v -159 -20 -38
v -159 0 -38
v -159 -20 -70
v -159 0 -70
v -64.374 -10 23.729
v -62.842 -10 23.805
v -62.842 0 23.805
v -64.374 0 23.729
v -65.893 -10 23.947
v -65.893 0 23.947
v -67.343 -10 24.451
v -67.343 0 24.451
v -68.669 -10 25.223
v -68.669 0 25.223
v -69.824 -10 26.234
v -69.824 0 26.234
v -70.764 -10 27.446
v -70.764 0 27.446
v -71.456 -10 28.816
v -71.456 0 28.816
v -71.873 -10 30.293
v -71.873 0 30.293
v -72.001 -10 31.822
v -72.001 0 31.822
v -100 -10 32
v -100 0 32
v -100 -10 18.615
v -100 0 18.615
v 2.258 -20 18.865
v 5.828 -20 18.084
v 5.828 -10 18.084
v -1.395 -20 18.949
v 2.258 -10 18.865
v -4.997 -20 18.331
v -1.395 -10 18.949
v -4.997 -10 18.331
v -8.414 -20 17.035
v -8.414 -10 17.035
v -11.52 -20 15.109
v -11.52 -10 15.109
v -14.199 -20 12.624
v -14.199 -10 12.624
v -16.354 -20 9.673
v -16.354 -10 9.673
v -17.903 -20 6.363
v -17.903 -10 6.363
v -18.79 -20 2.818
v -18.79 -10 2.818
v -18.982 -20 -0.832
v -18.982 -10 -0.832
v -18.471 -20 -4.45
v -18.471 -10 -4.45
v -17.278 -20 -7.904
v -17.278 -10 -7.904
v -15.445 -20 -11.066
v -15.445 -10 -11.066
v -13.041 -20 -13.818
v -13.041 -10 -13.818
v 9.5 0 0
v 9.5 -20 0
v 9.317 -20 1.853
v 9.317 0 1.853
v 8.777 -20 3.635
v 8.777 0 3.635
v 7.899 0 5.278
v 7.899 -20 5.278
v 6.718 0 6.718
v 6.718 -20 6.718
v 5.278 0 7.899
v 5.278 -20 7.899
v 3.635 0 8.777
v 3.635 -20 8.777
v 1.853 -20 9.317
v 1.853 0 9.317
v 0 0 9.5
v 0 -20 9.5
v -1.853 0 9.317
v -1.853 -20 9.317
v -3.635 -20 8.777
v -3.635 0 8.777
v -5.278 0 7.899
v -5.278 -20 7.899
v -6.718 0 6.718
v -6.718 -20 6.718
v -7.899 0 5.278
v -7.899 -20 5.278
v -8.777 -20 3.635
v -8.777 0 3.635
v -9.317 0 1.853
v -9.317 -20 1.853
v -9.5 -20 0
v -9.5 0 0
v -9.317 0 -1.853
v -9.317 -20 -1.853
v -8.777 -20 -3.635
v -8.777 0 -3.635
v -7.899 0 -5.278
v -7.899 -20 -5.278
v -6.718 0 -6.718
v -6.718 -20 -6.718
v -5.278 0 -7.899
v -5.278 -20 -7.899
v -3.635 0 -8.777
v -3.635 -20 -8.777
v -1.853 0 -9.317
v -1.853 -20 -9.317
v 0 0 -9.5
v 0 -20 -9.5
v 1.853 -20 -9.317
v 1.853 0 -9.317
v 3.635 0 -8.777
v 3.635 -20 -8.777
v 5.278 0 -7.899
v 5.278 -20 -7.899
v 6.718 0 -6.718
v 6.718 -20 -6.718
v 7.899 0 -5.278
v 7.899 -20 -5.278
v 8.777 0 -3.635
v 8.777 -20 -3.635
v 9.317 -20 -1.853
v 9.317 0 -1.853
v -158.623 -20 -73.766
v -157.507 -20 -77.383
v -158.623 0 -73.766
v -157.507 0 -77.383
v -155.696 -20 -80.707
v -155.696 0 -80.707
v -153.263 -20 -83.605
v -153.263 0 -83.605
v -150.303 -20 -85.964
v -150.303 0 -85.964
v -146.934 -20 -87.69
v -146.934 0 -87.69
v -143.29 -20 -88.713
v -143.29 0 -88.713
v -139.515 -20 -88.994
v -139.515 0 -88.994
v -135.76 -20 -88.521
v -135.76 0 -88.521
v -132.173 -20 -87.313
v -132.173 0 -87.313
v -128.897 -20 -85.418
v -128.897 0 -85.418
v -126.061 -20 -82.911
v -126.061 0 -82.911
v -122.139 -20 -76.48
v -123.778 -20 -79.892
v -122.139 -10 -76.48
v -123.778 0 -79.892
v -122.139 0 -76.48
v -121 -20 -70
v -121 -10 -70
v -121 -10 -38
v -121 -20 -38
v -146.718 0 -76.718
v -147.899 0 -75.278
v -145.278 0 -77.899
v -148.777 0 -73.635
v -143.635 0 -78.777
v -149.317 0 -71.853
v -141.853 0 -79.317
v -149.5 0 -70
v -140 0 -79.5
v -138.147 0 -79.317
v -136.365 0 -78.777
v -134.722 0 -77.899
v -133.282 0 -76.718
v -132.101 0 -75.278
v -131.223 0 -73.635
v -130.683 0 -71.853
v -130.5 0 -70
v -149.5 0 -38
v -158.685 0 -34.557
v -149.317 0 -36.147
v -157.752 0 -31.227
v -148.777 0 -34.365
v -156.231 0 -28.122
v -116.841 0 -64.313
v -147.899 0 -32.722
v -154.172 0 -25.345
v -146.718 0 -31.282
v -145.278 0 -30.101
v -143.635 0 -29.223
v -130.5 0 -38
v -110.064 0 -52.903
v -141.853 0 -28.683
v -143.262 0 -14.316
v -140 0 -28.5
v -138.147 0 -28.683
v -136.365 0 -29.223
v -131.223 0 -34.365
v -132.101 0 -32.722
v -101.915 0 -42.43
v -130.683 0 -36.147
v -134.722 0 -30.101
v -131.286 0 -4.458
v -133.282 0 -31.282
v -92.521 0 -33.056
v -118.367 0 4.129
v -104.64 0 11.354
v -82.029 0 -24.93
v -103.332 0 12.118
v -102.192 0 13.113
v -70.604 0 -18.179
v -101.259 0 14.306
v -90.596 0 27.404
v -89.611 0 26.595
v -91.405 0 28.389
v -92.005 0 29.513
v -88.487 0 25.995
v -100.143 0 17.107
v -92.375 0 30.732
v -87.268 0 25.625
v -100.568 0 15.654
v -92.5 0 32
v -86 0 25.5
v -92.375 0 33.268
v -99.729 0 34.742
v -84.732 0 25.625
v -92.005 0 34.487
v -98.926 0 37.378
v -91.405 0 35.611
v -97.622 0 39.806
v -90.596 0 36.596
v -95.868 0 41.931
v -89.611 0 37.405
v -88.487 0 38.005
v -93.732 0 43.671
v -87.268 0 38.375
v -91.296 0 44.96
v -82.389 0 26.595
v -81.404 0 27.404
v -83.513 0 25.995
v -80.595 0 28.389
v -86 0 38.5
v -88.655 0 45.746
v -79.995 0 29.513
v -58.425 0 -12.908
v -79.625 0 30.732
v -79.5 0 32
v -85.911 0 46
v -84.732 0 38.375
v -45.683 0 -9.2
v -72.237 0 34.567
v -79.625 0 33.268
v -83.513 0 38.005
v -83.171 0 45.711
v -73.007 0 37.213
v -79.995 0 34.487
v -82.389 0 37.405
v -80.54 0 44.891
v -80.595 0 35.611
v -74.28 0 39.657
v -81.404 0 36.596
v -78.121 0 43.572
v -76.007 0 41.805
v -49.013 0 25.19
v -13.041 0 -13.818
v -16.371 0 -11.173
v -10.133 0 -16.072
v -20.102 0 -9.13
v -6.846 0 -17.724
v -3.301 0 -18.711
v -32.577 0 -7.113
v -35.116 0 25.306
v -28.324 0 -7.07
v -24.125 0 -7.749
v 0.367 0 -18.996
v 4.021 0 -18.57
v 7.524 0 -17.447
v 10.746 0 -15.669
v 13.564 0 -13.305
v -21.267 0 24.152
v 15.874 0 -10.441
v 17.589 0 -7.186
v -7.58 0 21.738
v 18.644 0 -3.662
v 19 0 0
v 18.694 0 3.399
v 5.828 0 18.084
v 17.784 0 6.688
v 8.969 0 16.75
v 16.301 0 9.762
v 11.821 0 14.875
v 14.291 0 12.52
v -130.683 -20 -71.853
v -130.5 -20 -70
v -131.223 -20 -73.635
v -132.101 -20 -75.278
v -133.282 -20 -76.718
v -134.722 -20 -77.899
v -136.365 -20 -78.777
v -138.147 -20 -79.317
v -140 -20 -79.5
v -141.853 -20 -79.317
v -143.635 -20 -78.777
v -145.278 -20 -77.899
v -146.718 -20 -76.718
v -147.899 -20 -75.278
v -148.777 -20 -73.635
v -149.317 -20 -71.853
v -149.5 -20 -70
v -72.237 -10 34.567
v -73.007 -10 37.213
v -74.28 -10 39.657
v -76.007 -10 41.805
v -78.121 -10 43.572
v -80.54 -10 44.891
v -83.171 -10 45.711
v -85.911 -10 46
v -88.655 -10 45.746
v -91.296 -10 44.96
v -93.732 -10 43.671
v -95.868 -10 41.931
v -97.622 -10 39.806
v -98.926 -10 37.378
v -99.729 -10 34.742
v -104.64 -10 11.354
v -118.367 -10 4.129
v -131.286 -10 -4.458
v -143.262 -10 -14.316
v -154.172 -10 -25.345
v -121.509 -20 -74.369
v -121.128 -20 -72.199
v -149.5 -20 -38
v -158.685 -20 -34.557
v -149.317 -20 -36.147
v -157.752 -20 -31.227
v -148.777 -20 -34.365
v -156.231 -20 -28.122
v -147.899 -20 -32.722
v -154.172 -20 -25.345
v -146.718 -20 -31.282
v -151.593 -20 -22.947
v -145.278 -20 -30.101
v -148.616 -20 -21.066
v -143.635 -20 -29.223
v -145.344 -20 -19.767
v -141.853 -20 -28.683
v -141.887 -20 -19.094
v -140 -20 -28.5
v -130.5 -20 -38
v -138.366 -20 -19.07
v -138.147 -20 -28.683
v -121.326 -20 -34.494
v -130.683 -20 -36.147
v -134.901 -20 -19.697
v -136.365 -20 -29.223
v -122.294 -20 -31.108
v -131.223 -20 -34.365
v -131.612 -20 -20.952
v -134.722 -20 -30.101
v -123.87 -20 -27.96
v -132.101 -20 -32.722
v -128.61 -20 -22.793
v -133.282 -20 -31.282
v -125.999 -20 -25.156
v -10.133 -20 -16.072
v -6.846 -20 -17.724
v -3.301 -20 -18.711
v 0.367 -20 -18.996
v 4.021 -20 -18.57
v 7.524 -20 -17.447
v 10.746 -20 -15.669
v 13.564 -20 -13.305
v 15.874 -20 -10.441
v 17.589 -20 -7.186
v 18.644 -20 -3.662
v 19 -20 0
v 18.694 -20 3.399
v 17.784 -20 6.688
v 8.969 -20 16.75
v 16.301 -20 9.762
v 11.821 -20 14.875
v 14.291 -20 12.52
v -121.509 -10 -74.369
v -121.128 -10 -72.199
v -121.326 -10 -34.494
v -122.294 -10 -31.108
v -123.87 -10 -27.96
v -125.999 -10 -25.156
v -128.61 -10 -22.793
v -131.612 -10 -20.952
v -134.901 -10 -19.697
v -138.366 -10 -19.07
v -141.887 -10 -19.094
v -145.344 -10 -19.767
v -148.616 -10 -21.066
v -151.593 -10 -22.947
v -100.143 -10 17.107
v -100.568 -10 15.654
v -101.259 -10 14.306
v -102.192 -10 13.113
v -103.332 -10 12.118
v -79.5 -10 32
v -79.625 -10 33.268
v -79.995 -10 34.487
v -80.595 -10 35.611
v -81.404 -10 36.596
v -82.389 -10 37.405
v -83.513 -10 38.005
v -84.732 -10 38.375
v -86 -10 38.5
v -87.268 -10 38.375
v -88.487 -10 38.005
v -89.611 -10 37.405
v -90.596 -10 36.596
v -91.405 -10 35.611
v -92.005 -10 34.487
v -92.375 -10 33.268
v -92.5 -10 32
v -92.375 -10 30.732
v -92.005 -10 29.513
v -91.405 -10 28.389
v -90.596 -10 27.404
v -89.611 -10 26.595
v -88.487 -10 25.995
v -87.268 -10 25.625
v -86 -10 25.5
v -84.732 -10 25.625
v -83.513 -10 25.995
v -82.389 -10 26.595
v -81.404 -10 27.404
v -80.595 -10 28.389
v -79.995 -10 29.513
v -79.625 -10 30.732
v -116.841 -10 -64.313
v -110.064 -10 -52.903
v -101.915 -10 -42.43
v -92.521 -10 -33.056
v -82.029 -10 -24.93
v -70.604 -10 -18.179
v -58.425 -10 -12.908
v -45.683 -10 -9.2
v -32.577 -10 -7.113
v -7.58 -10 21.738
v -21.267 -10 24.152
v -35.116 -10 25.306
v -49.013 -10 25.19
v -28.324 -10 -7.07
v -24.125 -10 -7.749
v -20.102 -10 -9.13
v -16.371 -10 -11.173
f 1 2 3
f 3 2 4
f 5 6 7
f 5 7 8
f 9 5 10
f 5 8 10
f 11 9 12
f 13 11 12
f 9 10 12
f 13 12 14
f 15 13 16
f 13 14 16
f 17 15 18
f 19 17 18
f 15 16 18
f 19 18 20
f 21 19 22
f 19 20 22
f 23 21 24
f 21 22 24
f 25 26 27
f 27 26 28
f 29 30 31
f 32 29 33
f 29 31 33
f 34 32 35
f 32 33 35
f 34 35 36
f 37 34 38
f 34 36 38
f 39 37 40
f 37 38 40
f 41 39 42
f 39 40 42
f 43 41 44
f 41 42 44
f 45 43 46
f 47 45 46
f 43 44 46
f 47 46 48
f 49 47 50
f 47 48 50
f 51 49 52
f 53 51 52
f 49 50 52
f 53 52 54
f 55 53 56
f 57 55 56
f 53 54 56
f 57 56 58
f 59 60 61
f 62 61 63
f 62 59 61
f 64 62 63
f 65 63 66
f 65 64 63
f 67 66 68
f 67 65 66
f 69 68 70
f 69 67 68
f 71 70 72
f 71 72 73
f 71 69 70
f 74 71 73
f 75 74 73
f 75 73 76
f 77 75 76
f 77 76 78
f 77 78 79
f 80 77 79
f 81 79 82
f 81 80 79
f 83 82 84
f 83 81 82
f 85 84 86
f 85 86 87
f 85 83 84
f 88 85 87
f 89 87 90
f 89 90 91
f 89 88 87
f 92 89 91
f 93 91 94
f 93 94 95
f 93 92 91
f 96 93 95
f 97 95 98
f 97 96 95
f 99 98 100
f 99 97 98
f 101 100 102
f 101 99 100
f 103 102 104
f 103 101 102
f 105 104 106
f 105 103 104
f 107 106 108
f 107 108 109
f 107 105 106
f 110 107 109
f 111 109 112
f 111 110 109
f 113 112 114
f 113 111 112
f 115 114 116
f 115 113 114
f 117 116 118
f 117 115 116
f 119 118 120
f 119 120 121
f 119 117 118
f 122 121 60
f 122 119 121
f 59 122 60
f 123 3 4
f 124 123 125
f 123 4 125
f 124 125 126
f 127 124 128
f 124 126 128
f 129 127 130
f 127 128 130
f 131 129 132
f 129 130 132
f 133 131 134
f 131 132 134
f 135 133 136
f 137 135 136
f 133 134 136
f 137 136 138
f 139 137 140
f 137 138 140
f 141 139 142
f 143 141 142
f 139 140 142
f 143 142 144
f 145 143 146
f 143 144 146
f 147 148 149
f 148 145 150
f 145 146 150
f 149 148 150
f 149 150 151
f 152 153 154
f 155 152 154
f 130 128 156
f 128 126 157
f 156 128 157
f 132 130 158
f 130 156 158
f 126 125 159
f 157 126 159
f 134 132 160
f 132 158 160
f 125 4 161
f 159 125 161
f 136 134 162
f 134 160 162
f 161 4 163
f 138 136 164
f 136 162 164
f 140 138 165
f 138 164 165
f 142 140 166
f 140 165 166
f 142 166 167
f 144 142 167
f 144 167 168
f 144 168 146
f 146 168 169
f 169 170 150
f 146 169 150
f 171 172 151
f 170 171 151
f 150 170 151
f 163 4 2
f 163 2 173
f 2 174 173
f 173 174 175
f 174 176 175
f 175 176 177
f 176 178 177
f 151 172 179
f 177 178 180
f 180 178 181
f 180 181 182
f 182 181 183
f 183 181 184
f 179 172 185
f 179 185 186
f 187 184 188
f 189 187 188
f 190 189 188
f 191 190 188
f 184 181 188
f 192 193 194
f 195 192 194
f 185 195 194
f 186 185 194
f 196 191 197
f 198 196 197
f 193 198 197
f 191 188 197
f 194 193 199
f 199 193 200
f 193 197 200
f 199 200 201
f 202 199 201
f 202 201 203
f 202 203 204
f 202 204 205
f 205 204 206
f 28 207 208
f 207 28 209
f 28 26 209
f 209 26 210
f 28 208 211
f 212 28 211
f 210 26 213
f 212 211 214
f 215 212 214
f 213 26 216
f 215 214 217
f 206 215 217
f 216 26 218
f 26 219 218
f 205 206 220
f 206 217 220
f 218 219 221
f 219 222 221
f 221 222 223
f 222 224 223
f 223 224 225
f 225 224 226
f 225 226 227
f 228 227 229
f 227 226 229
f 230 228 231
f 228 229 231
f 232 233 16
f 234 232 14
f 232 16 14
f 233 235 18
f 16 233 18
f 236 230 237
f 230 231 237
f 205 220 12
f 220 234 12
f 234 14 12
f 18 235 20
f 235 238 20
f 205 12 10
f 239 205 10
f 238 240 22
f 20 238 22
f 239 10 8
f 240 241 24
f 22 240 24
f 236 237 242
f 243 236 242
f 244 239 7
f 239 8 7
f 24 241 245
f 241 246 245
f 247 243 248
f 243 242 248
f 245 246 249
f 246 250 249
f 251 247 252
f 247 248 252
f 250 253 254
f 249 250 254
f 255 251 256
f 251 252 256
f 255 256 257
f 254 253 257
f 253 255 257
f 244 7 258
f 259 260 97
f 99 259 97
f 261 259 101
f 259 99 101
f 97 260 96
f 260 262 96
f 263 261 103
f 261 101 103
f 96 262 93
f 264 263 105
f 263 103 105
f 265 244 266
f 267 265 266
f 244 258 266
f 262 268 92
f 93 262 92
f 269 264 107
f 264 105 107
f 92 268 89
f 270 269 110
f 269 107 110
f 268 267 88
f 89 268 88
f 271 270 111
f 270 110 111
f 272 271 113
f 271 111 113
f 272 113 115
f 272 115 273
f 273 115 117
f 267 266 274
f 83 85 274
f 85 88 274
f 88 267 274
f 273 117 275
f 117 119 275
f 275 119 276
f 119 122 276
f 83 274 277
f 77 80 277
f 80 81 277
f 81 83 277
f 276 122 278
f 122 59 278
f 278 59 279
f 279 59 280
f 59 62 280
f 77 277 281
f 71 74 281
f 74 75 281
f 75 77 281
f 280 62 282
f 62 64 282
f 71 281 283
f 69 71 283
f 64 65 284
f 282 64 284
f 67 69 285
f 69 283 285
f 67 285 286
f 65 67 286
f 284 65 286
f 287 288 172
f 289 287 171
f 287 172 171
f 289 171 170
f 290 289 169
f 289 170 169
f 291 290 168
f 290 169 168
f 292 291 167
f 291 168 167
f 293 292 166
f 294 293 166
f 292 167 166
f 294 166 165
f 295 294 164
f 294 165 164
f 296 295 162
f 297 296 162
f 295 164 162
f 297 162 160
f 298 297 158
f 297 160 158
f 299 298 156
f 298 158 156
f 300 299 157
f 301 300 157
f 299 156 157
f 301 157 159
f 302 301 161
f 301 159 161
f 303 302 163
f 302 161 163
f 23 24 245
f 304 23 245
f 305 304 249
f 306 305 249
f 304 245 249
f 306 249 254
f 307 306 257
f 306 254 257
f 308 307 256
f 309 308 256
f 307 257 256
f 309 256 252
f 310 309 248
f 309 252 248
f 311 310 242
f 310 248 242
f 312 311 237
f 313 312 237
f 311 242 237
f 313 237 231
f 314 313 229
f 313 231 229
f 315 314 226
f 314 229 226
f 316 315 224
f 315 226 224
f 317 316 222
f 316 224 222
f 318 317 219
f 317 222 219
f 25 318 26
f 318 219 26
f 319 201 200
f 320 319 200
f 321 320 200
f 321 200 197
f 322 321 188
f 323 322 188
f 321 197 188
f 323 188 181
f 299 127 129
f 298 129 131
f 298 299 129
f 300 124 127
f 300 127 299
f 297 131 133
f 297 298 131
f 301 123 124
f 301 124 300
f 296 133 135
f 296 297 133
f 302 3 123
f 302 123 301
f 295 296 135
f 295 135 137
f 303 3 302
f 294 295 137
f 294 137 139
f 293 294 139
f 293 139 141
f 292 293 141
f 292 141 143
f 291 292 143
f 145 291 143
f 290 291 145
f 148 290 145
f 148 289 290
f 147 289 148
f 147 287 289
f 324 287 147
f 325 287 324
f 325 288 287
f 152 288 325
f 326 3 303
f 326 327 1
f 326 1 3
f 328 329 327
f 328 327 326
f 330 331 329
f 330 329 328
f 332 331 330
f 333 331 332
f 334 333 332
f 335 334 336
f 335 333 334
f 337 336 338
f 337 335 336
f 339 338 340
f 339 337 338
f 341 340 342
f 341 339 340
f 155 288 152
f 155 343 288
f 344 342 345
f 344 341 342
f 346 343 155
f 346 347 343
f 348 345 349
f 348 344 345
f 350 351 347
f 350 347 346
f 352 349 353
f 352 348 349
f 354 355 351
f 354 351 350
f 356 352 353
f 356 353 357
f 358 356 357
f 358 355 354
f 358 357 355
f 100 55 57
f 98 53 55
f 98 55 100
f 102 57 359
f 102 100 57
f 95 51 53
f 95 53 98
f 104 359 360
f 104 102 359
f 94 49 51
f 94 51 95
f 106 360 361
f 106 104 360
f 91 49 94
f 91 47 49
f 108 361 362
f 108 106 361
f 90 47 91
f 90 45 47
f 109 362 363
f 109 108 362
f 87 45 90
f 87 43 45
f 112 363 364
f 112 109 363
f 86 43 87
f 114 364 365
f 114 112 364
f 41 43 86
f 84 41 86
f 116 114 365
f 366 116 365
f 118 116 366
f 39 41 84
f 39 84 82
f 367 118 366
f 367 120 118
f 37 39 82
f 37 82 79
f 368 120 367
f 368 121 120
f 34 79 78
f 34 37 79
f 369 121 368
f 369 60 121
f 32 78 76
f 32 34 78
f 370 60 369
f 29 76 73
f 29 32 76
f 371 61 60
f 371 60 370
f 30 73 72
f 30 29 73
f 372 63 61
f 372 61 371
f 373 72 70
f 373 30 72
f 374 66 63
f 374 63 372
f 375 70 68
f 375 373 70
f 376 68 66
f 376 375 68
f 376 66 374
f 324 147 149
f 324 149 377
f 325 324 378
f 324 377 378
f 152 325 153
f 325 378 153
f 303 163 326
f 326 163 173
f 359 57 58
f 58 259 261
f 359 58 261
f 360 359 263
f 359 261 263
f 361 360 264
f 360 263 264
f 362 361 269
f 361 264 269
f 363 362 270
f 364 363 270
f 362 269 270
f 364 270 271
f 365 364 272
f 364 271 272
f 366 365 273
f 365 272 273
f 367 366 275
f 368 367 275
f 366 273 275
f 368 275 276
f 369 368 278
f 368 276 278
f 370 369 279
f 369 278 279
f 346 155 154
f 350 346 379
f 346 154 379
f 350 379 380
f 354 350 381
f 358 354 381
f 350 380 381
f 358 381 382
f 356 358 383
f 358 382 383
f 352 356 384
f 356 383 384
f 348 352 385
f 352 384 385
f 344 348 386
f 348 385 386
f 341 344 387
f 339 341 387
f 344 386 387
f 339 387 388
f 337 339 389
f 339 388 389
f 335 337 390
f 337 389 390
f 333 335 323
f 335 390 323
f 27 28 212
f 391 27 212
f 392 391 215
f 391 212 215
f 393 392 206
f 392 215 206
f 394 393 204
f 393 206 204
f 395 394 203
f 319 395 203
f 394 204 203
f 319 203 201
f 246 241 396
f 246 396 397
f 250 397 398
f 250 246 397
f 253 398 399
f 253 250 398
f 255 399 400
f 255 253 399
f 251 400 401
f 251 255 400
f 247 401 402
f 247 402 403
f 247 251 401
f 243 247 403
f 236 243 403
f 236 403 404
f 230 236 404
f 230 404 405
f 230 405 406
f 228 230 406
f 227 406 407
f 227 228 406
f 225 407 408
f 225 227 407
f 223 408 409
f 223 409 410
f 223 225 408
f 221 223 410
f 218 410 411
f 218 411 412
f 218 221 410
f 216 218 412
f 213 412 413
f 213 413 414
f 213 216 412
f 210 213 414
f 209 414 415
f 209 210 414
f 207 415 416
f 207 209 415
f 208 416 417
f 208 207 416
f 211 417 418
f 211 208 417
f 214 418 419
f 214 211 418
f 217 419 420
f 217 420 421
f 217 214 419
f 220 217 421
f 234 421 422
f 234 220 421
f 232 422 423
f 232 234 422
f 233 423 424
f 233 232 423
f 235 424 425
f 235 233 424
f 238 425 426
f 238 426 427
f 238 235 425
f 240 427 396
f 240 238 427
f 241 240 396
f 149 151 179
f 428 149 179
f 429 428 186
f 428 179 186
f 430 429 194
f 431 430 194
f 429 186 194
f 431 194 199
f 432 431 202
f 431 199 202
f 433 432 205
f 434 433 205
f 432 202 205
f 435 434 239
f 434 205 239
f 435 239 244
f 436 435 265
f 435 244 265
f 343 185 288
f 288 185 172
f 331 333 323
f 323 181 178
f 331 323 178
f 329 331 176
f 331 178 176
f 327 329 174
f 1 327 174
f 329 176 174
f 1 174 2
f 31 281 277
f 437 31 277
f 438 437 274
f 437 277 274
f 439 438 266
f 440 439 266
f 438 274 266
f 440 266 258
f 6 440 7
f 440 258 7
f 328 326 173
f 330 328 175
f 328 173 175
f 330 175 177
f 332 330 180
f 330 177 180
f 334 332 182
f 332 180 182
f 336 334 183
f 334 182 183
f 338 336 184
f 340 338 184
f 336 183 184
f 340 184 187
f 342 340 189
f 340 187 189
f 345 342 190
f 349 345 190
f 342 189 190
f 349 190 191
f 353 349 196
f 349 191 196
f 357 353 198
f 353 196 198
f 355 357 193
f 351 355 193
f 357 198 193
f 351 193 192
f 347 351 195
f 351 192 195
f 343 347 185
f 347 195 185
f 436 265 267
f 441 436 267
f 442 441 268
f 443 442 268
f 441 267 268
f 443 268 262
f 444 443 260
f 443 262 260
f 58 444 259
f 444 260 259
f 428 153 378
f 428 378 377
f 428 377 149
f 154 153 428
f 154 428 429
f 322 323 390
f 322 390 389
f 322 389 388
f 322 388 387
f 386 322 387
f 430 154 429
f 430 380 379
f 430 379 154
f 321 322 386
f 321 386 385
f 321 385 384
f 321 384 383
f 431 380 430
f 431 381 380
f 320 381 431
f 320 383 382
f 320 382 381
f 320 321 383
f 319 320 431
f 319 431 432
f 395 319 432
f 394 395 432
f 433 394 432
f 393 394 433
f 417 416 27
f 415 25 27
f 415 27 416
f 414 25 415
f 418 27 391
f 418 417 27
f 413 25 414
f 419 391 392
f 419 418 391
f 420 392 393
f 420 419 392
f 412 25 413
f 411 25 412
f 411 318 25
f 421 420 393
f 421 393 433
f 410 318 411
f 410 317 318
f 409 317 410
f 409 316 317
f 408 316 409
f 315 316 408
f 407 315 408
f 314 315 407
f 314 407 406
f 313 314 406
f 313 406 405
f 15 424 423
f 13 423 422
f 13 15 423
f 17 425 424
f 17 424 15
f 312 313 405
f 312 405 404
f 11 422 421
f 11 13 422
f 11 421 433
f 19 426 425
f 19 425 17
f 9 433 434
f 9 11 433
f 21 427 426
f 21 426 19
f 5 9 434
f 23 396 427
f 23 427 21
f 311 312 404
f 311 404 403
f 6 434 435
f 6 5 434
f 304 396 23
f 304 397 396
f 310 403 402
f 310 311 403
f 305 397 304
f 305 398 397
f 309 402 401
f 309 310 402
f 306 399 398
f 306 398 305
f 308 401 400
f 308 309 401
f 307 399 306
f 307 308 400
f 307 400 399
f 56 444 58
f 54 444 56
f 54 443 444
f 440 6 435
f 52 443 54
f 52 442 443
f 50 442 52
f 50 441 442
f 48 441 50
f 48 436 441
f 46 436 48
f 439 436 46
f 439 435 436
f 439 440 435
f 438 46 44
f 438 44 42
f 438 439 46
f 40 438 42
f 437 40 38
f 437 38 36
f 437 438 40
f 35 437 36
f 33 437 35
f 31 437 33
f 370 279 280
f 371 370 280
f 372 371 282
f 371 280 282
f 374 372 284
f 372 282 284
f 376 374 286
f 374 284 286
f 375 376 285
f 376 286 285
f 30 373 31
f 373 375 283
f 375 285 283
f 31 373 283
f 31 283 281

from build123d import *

# Parameters (mm, degrees)
F0_R     = 6.5
F1_DEPTH = 10
F0_R_2   = 9.5
F2_DEPTH = 20


with BuildPart() as f1:
    # F0 (on Front) → F1 (new body)
    with BuildSketch(Plane.XZ):
        with BuildLine():
            ThreePointArc((-13.040623, -13.818182), (-16.353666, 9.672518), (5.828214, 18.084024))
            ThreePointArc((5.828214, 18.084024), (-28.178216, 24.88709), (-62.841564, 23.804848))
            ThreePointArc((-62.841564, 23.804848), (-69.270753, 25.700477), (-72.001132, 31.82199))
            ThreePointArc((-72.001132, 31.82199), (-85.910993, 45.999717), (-100, 32))
            Line((-100, 32), (-100, 18.614531))
            ThreePointArc((-100, 18.614531), (-101.259043, 14.306457), (-104.639875, 11.354396))
            ThreePointArc((-104.639875, 11.354396), (-131.285838, -4.457663), (-154.171786, -25.344547))
            ThreePointArc((-154.171786, -25.344547), (-133.227406, -20.248043), (-121, -38))
            Line((-121, -38), (-121, -70))
            ThreePointArc((-121, -70), (-121.286974, -73.289778), (-122.139225, -76.480179))
            ThreePointArc((-122.139225, -76.480179), (-87.401951, -28.828969), (-32.57725, -7.113346))
            ThreePointArc((-32.57725, -7.113346), (-22.084121, -8.35379), (-13.040623, -13.818182))
        make_face()
        with Locations((-86, 32)):
            Circle(F0_R, mode=Mode.SUBTRACT)
    extrude(amount=F1_DEPTH)

    # F0 (on Front) → F2 (join)
    with BuildSketch(Plane.XZ):
        with BuildLine():
            ThreePointArc((-159, -70), (-143.289778, -88.713026), (-122.139225, -76.480179))
            ThreePointArc((-122.139225, -76.480179), (-121.286974, -73.289778), (-121, -70))
            Line((-121, -70), (-121, -38))
            ThreePointArc((-121, -38), (-133.227406, -20.248043), (-154.171786, -25.344547))
            ThreePointArc((-154.171786, -25.344547), (-157.751957, -31.227406), (-159, -38))
            Line((-159, -38), (-159, -70))
        make_face()
        with BuildLine():
            ThreePointArc((-149.5, -38), (-140, -28.5), (-130.5, -38))
            Line((-130.5, -38), (-130.5, -70))
            ThreePointArc((-130.5, -70), (-140, -79.5), (-149.5, -70))
            Line((-149.5, -70), (-149.5, -38))
        make_face(mode=Mode.SUBTRACT)
        with BuildLine():
            ThreePointArc((-13.040623, -13.818182), (7.524233, -17.446659), (19, 0))
            ThreePointArc((19, 0), (15.357996, 11.18624), (5.828214, 18.084024))
            ThreePointArc((5.828214, 18.084024), (-16.353666, 9.672518), (-13.040623, -13.818182))
        make_face()
        Circle(F0_R_2, mode=Mode.SUBTRACT)
    extrude(amount=F2_DEPTH)


solid = f1.part
